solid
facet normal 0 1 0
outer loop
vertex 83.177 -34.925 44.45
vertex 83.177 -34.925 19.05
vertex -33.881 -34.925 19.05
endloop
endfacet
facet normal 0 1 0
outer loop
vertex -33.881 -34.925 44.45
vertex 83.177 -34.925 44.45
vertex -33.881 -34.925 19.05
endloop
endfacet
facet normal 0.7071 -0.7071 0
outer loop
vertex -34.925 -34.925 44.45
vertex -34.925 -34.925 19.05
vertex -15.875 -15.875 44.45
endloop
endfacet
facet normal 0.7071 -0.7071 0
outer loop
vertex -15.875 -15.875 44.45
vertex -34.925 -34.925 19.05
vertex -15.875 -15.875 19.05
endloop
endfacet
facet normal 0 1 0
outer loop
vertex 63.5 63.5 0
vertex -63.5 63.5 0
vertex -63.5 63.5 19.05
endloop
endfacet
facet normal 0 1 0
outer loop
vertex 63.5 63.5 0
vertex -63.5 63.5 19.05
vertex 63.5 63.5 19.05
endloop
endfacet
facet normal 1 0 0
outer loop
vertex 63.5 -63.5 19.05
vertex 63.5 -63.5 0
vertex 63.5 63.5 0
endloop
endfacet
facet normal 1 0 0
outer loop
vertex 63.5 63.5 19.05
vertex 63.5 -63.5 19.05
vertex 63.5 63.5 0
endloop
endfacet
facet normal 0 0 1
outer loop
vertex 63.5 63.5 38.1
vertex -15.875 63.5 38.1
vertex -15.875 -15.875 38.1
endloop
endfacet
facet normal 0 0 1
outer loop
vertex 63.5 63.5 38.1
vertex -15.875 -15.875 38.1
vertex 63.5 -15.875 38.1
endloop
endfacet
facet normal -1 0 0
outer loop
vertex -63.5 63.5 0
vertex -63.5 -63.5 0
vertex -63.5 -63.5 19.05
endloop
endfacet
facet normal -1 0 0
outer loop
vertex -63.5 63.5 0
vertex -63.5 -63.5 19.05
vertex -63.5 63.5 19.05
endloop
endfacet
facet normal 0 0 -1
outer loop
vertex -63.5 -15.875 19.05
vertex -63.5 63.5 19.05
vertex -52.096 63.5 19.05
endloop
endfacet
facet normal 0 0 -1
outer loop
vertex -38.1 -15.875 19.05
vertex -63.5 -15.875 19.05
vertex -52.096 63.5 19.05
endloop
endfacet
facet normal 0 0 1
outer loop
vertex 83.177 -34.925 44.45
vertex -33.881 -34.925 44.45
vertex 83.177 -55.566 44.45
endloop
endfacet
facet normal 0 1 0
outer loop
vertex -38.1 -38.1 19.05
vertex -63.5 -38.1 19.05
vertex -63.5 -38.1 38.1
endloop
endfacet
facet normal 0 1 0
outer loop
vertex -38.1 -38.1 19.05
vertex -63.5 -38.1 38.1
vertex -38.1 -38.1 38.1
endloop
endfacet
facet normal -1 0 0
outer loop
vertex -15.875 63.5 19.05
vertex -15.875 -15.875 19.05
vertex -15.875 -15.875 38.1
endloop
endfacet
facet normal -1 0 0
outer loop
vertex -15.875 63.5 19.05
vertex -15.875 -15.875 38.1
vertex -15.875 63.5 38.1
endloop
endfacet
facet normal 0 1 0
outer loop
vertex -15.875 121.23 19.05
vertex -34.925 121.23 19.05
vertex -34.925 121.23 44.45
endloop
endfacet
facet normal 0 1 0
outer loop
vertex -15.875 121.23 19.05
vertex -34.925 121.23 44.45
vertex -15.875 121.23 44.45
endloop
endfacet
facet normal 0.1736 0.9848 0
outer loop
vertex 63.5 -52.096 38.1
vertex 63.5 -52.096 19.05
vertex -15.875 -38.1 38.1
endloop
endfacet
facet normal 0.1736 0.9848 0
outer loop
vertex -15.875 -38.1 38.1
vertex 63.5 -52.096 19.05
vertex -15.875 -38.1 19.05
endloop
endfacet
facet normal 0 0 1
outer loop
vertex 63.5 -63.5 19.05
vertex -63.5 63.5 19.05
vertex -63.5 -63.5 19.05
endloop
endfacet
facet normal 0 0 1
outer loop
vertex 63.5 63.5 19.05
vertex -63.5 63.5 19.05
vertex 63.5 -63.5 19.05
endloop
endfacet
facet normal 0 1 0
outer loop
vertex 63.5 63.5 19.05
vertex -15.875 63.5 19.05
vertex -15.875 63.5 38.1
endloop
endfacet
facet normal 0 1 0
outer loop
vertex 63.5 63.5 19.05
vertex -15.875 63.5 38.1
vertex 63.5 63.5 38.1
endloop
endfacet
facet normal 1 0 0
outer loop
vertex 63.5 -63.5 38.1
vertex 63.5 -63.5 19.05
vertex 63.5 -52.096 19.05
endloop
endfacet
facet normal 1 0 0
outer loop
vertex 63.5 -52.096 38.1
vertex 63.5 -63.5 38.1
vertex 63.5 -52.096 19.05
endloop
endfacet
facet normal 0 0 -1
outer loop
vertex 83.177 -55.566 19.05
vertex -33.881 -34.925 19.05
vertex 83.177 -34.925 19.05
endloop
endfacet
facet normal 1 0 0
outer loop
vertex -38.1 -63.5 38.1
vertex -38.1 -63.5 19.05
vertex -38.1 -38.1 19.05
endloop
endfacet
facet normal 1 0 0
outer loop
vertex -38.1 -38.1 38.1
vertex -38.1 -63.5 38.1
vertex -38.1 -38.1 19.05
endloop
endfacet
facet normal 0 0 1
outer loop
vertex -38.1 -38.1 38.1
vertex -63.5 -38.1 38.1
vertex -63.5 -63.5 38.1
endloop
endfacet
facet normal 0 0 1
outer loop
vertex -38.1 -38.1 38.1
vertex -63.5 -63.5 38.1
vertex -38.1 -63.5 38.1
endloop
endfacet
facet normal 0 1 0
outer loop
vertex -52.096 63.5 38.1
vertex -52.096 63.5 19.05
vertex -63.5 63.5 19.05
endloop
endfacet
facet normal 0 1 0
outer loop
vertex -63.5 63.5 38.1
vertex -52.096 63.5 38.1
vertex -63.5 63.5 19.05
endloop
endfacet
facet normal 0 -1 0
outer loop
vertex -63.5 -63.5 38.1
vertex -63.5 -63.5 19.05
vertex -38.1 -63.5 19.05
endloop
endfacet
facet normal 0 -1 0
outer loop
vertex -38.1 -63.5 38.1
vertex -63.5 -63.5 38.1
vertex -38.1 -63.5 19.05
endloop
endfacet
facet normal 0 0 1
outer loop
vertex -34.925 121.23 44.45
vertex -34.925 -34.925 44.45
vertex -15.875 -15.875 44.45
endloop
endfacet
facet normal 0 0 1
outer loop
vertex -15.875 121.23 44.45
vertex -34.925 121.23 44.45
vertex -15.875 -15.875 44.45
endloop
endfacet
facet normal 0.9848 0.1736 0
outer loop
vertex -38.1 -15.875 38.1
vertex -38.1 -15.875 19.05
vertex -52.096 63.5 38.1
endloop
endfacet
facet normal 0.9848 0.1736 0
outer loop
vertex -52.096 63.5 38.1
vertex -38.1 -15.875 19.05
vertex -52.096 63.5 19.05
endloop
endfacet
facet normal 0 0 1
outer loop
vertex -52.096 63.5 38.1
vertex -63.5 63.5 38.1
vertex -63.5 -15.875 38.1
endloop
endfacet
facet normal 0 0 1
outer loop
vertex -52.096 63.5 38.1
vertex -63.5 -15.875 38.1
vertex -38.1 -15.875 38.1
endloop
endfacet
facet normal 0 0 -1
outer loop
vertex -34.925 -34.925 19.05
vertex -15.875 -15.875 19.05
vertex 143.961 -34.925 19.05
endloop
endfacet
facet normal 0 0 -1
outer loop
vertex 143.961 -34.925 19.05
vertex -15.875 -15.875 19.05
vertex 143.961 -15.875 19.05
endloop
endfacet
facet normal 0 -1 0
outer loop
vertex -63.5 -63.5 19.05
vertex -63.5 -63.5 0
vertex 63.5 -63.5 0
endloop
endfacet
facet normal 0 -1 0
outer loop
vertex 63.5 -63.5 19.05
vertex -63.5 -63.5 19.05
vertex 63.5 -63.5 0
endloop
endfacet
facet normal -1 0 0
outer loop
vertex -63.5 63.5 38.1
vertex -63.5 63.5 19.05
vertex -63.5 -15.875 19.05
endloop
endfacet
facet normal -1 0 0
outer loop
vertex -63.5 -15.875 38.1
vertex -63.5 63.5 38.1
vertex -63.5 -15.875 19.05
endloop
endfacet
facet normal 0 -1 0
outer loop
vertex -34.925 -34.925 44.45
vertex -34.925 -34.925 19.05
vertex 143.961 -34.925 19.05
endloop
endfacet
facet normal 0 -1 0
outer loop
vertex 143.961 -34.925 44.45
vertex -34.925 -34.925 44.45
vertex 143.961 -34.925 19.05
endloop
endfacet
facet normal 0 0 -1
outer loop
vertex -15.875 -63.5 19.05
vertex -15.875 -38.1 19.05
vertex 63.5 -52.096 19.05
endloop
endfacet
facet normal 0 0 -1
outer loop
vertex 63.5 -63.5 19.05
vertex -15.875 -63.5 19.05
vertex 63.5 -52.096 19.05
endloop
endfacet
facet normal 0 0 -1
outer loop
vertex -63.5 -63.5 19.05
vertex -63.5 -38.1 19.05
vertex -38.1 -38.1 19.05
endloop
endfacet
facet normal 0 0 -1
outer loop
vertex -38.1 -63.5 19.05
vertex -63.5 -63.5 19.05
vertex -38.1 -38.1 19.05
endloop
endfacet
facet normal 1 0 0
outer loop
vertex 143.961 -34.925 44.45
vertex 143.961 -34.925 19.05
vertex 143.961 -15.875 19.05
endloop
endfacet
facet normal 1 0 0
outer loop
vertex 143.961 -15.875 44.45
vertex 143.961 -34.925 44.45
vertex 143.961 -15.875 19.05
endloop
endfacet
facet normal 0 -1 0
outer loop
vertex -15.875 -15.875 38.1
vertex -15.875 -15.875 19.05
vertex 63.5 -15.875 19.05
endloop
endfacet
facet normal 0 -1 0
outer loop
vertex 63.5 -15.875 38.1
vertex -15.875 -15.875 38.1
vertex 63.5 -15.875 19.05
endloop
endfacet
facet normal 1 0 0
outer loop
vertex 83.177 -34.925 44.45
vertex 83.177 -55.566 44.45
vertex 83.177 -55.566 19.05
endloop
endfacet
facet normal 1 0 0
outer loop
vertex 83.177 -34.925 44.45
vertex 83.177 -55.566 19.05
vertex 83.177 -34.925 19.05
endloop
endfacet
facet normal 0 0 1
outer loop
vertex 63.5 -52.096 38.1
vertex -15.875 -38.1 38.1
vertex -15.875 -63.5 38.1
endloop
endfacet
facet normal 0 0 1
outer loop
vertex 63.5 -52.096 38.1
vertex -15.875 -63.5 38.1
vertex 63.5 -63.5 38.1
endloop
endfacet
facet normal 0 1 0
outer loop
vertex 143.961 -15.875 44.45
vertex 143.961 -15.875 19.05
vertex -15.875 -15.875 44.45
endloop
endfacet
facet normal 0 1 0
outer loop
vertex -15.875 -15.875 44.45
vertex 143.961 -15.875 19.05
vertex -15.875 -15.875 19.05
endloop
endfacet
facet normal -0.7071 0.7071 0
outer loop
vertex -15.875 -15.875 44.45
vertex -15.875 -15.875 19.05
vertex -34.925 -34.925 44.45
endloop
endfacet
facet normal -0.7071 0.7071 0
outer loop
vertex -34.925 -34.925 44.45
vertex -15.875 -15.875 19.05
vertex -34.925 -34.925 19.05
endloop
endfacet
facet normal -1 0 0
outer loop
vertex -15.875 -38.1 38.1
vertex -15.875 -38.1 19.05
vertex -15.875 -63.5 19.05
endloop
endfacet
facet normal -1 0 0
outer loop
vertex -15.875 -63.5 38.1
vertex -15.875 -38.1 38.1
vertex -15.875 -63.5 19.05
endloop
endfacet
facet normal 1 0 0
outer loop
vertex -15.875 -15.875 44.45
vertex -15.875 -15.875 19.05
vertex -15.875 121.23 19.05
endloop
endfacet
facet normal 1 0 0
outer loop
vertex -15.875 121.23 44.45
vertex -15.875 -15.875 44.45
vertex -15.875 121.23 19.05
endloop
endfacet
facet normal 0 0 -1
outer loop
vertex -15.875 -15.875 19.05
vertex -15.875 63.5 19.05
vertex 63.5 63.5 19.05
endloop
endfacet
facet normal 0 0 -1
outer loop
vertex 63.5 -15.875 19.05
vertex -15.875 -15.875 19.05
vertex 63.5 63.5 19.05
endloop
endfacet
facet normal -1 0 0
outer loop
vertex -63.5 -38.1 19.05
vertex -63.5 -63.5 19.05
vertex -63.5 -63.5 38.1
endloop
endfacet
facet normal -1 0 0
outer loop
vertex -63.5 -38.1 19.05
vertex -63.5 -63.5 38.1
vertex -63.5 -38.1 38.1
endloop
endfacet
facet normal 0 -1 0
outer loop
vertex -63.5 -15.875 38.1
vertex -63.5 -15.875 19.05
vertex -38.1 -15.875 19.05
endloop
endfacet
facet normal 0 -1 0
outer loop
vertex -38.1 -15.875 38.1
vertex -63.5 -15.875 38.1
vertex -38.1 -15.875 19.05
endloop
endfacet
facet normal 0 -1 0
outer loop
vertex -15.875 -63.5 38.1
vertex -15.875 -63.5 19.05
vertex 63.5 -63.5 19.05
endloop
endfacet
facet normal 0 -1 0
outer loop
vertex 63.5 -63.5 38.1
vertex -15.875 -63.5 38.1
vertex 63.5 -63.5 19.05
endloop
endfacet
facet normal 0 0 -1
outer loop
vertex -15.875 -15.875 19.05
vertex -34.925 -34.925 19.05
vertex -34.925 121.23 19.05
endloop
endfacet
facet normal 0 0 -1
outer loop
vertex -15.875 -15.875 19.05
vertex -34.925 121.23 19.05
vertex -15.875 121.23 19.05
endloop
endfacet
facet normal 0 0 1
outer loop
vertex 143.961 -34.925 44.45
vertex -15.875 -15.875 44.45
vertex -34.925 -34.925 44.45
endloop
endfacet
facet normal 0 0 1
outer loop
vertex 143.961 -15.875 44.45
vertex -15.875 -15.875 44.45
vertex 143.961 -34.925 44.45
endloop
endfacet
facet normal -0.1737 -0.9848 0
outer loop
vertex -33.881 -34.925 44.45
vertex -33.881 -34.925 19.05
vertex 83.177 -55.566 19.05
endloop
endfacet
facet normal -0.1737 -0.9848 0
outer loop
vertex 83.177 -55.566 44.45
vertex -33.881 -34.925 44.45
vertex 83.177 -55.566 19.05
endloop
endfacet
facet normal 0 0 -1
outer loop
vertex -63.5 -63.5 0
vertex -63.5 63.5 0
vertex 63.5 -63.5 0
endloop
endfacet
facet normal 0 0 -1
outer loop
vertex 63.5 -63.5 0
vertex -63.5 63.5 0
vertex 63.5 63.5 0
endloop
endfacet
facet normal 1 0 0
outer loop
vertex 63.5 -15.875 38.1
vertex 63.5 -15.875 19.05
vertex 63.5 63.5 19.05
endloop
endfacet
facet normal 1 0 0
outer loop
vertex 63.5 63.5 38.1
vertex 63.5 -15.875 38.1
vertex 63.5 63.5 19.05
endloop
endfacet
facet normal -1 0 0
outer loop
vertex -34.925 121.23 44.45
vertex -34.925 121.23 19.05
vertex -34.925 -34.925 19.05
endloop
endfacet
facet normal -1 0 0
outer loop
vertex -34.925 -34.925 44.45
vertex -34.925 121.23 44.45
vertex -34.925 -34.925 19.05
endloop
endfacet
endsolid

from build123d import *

# Parameters (mm, degrees)
F0_W     = 127
F0_H     = 127
F1_DEPTH = 19.05
F2_W     = 25.4
F2_H     = 25.4
F2_W_2   = 79.375
F2_H_2   = 79.375
F3_DEPTH = 19.05
F5_DEPTH = 25.4
F6_W     = 19.05
F6_H     = 57.72996
F7_DEPTH = 25.4
F6_W_2   = 80.461032
F6_H_2   = 19.05
F8_DEPTH = 25.4


with BuildPart() as f1:
    # F0 (on Top) → F1 (new body)
    with BuildSketch(Plane.XY):
        Rectangle(F0_W, F0_H)
    extrude(amount=F1_DEPTH)


with BuildPart() as f3:
    # F2 (on face) → F3 (new body)
    with BuildSketch(Plane.XY.offset(19.05)):
        Polygon((-63.5, 63.5), (-63.5, -15.875), (-38.1, -15.875), (-52.095954, 63.5), align=None)
        with Locations((-50.8, -50.8)):
            Rectangle(F2_W, F2_H)
        Polygon((-15.875, -38.1), (-15.875, -63.5), (63.5, -63.5), (63.5, -52.095954), align=None)
        with Locations((23.8125, 23.8125)):
            Rectangle(F2_W_2, F2_H_2)
    extrude(amount=F3_DEPTH)


with BuildPart() as f5:
    # F4 (on face) → F5 (new body)
    with BuildSketch(Plane.XY.offset(19.05)):
        Polygon((83.1773, -55.565593), (83.1773, -34.925), (-33.88132, -34.925), align=None)
    extrude(amount=F5_DEPTH)


with BuildPart() as f7:
    # F6 (on face) → F7 (new body)
    with BuildSketch(Plane.XY.offset(19.05)):
        Polygon((-34.925, 63.5), (-34.925, -34.925), (-15.875, -15.875), (-15.875, 63.5), align=None)
        with Locations((-25.4, 92.36498)):
            Rectangle(F6_W, F6_H)
    extrude(amount=F7_DEPTH)


with BuildPart() as f8:
    # F6 (on face) → F8 (new body)
    with BuildSketch(Plane.XY.offset(19.05)):
        Polygon((-15.875, -15.875), (-34.925, -34.925), (63.5, -34.925), (63.5, -15.875), align=None)
        with Locations((103.730516, -25.4)):
            Rectangle(F6_W_2, F6_H_2)
    extrude(amount=F8_DEPTH)


solid = Compound([f1.part, f3.part, f5.part, f7.part, f8.part])
